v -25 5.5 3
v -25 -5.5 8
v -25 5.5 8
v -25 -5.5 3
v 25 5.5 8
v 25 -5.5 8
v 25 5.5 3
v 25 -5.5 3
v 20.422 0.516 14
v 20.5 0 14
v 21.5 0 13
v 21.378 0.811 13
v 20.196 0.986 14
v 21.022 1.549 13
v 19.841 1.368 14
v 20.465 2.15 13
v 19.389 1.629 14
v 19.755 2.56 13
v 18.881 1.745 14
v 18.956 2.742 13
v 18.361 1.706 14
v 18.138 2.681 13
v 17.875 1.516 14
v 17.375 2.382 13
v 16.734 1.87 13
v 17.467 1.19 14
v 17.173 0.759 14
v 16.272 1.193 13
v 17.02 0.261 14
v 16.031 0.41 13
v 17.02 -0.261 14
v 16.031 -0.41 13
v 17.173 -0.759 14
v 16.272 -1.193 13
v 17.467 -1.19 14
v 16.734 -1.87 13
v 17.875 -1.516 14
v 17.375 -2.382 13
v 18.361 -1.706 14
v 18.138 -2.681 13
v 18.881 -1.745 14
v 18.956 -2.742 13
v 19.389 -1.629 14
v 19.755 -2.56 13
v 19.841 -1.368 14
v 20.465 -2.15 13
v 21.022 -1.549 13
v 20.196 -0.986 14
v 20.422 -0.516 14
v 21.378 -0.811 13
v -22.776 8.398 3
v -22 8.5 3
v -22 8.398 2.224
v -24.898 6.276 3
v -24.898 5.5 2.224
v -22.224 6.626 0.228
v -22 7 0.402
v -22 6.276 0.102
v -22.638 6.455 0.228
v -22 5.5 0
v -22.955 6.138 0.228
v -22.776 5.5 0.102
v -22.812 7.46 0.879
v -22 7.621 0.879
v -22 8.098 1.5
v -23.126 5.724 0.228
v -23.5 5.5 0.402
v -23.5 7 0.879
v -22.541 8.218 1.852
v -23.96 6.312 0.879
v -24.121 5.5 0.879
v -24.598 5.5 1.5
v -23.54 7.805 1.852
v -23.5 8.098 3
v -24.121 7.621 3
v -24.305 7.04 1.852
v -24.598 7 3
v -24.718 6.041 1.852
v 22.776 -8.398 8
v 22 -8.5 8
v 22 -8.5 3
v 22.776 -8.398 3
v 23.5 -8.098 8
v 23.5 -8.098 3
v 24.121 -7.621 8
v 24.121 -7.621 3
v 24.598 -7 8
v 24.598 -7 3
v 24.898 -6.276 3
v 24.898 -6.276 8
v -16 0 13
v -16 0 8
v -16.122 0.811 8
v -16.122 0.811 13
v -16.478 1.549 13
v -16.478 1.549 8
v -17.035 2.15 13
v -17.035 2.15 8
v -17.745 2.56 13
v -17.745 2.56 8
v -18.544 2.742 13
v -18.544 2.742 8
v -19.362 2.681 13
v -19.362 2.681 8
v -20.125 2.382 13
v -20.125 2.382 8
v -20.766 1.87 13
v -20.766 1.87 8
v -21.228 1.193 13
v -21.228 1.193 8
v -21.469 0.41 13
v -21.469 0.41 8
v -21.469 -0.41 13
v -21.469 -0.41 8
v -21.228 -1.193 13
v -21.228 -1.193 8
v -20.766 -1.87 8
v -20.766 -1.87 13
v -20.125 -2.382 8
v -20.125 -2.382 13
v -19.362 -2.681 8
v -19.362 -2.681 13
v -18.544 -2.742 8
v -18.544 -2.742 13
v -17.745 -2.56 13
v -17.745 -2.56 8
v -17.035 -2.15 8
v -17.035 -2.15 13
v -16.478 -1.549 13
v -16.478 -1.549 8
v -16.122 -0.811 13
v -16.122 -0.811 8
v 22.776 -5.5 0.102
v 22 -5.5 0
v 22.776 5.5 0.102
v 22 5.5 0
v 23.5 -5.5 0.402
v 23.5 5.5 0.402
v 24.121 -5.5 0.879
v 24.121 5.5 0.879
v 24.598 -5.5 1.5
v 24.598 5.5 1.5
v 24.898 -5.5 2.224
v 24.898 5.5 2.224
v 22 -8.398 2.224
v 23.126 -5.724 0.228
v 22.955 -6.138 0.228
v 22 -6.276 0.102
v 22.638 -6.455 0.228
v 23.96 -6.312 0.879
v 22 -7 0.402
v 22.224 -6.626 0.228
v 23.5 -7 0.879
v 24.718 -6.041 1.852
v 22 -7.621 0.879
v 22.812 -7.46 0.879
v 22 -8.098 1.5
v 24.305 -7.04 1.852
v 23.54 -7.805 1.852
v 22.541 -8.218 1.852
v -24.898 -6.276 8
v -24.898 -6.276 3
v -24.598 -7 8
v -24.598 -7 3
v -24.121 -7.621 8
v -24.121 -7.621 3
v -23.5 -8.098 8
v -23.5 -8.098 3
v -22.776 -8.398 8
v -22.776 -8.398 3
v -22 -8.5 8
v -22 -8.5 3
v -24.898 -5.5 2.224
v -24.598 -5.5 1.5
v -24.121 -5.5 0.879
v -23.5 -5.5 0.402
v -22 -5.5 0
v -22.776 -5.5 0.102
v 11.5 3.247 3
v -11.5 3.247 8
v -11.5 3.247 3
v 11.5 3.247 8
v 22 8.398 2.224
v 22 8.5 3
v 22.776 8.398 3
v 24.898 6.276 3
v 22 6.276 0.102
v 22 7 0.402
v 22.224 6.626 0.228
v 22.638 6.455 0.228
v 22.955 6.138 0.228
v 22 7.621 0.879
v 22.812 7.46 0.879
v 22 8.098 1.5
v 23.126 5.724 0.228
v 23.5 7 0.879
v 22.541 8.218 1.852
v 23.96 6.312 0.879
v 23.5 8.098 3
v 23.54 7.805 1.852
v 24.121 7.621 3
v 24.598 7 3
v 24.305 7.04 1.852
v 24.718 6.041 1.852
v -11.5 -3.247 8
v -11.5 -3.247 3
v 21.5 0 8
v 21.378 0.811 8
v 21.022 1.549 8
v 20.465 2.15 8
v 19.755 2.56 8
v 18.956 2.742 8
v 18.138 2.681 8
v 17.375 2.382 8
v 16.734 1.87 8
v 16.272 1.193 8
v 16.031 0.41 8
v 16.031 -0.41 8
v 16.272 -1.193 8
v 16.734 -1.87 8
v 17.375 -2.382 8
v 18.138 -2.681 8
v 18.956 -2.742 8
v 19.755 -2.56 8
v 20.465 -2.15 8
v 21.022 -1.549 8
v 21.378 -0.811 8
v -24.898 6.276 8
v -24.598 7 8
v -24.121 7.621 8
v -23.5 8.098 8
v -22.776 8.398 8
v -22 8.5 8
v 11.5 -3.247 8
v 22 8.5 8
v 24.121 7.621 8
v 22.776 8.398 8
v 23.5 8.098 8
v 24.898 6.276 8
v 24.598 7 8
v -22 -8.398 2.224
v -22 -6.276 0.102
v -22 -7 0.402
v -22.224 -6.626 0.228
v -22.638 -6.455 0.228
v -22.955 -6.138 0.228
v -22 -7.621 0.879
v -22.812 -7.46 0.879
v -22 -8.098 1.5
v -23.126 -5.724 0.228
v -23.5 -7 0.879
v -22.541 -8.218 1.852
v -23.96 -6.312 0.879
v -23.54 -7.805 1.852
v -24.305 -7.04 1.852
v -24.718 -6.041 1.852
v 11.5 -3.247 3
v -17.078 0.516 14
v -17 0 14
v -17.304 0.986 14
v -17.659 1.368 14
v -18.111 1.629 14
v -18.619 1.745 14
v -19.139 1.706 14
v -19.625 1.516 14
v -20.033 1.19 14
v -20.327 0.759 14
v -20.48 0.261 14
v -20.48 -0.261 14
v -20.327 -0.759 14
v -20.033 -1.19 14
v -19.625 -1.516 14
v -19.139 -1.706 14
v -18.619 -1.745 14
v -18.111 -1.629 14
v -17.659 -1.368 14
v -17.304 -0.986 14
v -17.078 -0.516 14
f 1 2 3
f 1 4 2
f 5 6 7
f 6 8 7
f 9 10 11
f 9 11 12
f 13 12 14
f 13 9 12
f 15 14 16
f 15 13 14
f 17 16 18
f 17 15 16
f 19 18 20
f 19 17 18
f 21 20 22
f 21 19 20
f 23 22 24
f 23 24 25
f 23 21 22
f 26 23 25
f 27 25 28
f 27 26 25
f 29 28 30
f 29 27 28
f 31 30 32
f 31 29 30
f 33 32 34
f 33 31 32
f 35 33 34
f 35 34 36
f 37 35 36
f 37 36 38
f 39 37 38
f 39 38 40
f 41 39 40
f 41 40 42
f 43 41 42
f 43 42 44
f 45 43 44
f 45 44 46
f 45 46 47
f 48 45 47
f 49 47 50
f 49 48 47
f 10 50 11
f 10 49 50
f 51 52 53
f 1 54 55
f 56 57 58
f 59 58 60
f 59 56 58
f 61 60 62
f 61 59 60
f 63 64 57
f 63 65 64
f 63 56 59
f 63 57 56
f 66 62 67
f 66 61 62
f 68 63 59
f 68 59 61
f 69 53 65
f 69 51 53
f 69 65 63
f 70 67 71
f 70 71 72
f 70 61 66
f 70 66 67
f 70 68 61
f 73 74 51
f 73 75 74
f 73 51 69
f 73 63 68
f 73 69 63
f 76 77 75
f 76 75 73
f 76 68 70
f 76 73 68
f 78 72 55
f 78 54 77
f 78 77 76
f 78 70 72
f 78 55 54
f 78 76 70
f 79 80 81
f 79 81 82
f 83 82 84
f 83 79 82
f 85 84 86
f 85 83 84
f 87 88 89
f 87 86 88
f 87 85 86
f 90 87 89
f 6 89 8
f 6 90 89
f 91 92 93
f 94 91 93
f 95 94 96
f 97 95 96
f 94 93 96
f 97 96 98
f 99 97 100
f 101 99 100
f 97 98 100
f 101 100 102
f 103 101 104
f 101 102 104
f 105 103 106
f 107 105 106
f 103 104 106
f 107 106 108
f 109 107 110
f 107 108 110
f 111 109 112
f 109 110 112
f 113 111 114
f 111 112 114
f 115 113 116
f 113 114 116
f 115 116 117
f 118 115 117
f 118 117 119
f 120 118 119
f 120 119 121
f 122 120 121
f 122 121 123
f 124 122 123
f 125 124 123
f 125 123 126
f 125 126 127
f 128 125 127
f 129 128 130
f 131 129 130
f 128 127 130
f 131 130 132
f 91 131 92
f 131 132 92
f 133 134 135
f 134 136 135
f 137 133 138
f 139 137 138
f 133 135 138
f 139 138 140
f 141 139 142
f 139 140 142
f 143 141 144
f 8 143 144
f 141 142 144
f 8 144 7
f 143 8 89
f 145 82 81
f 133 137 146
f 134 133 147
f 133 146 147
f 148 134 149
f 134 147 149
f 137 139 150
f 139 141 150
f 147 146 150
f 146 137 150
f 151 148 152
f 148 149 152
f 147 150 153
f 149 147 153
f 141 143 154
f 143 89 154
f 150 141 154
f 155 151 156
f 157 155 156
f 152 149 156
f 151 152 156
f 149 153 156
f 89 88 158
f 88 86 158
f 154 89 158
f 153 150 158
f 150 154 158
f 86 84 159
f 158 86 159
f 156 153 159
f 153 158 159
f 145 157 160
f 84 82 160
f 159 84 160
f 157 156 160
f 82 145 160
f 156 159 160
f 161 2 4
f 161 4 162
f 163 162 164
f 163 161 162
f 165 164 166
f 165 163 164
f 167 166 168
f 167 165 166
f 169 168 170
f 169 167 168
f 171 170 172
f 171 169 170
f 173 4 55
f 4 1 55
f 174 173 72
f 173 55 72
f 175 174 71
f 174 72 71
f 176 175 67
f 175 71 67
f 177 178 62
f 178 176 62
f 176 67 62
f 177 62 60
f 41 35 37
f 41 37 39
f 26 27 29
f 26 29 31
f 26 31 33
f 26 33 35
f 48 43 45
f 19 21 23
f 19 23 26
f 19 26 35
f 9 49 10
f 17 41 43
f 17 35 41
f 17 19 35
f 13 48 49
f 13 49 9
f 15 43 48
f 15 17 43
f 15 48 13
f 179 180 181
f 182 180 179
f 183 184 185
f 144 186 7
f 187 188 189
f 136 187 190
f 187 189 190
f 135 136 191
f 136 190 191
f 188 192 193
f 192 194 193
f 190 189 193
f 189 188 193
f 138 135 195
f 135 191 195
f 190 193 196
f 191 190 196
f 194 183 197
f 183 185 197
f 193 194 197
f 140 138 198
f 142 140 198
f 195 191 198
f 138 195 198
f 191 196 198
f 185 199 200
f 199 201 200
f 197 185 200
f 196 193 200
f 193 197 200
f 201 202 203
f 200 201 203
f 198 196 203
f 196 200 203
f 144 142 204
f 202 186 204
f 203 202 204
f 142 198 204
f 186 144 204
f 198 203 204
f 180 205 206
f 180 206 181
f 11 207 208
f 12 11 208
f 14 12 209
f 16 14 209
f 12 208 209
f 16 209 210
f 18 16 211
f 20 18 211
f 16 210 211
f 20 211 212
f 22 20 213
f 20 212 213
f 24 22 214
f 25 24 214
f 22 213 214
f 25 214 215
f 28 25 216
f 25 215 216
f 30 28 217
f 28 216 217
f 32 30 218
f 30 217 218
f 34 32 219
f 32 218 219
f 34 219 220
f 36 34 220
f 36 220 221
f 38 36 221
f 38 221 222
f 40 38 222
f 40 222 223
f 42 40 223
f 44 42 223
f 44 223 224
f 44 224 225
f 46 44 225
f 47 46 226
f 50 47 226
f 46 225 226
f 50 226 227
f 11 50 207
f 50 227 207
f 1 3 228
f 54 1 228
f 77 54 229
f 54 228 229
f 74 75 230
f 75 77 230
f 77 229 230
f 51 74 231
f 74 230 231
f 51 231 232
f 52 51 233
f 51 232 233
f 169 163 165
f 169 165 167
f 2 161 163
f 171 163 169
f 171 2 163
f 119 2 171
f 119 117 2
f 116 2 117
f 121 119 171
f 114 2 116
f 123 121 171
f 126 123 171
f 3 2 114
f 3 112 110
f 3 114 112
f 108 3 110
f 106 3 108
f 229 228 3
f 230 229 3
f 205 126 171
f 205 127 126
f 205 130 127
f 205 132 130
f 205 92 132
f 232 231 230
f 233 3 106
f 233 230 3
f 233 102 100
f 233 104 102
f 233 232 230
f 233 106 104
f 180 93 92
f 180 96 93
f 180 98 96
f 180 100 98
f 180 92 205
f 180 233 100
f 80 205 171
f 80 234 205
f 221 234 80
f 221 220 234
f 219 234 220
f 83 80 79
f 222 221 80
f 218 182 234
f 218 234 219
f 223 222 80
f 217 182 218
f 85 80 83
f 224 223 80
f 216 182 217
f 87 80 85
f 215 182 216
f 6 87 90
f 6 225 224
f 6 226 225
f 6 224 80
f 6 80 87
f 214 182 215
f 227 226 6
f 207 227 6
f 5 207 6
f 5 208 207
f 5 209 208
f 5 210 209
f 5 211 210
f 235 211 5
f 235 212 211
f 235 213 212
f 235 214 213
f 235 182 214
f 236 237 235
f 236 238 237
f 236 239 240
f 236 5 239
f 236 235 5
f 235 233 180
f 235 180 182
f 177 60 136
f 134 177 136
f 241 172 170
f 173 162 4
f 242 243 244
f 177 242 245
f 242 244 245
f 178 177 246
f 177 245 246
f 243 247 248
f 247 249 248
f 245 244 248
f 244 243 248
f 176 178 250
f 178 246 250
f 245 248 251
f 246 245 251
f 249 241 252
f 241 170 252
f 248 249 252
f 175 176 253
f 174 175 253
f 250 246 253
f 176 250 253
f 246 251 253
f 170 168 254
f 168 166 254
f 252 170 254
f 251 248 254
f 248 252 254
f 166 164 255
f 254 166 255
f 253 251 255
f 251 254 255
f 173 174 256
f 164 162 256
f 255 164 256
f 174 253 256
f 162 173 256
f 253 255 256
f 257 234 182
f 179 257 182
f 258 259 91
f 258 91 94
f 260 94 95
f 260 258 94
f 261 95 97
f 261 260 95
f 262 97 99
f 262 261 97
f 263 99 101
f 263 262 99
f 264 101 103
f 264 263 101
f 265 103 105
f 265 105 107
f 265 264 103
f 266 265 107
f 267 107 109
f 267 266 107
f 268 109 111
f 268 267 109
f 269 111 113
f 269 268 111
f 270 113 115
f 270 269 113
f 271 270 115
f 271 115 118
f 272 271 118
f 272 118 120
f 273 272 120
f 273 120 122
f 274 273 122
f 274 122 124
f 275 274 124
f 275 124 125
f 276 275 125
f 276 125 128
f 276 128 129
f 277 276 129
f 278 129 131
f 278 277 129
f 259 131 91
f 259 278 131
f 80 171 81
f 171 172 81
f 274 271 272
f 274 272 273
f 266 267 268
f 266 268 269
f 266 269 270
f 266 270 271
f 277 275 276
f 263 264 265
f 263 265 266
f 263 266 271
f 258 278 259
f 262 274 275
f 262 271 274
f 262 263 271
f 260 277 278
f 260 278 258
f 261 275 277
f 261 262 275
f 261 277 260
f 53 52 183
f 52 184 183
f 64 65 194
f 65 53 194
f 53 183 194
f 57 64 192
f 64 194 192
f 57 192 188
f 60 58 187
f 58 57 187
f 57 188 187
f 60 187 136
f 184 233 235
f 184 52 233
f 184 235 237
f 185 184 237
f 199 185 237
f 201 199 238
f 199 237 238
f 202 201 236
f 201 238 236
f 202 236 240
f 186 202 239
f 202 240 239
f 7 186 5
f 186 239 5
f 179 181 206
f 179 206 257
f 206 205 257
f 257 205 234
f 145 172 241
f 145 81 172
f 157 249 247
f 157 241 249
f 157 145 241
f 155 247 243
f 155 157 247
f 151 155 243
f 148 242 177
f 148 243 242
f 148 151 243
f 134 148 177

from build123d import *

# Parameters (mm, degrees)
F0_W     = 50
F0_H     = 17
F1_DEPTH = 8
F2_R     = 2.75
F3_DEPTH = 6
F2_W     = 23
F2_H     = 6.494846
F4_DEPTH = 5
F5_R     = 3
F6_SIZE  = 1


with BuildPart() as f1:
    # F0 (on Top) → F1 (new body)
    with BuildSketch(Plane.XY):
        Rectangle(F0_W, F0_H)
    extrude(amount=F1_DEPTH)

    # F2 (on face) → F3 (join)
    with BuildSketch(Plane.XY.offset(8)):
        with Locations((-18.75, 0)):
            Circle(F2_R)
        with Locations((18.75, 0)):
            Circle(F2_R)
    extrude(amount=F3_DEPTH)

    # F2 (on face) → F4 (cut)
    with BuildSketch(Plane.XY.offset(8)):
        Rectangle(F2_W, F2_H)
    extrude(amount=-F4_DEPTH, mode=Mode.SUBTRACT)

    # F5
    f5_edges = [f1.edges().sort_by_distance(p)[0] for p in [
        (-25, -8.5, 4),
        (25, -8.5, 4),
        (-25, 8.5, 4),
        (25, 8.5, 4),
        (0, 8.5, 0),
        (25, 0, 0),
        (0, -8.5, 0),
        (-25, 0, 0),
    ]]
    fillet(f5_edges, radius=F5_R)

    # F6
    f6_edges = [f1.edges().sort_by_distance(p)[0] for p in [
        (-21.5, 0, 14),
        (16, 0, 14),
    ]]
    chamfer(f6_edges, length=F6_SIZE)


solid = f1.part
